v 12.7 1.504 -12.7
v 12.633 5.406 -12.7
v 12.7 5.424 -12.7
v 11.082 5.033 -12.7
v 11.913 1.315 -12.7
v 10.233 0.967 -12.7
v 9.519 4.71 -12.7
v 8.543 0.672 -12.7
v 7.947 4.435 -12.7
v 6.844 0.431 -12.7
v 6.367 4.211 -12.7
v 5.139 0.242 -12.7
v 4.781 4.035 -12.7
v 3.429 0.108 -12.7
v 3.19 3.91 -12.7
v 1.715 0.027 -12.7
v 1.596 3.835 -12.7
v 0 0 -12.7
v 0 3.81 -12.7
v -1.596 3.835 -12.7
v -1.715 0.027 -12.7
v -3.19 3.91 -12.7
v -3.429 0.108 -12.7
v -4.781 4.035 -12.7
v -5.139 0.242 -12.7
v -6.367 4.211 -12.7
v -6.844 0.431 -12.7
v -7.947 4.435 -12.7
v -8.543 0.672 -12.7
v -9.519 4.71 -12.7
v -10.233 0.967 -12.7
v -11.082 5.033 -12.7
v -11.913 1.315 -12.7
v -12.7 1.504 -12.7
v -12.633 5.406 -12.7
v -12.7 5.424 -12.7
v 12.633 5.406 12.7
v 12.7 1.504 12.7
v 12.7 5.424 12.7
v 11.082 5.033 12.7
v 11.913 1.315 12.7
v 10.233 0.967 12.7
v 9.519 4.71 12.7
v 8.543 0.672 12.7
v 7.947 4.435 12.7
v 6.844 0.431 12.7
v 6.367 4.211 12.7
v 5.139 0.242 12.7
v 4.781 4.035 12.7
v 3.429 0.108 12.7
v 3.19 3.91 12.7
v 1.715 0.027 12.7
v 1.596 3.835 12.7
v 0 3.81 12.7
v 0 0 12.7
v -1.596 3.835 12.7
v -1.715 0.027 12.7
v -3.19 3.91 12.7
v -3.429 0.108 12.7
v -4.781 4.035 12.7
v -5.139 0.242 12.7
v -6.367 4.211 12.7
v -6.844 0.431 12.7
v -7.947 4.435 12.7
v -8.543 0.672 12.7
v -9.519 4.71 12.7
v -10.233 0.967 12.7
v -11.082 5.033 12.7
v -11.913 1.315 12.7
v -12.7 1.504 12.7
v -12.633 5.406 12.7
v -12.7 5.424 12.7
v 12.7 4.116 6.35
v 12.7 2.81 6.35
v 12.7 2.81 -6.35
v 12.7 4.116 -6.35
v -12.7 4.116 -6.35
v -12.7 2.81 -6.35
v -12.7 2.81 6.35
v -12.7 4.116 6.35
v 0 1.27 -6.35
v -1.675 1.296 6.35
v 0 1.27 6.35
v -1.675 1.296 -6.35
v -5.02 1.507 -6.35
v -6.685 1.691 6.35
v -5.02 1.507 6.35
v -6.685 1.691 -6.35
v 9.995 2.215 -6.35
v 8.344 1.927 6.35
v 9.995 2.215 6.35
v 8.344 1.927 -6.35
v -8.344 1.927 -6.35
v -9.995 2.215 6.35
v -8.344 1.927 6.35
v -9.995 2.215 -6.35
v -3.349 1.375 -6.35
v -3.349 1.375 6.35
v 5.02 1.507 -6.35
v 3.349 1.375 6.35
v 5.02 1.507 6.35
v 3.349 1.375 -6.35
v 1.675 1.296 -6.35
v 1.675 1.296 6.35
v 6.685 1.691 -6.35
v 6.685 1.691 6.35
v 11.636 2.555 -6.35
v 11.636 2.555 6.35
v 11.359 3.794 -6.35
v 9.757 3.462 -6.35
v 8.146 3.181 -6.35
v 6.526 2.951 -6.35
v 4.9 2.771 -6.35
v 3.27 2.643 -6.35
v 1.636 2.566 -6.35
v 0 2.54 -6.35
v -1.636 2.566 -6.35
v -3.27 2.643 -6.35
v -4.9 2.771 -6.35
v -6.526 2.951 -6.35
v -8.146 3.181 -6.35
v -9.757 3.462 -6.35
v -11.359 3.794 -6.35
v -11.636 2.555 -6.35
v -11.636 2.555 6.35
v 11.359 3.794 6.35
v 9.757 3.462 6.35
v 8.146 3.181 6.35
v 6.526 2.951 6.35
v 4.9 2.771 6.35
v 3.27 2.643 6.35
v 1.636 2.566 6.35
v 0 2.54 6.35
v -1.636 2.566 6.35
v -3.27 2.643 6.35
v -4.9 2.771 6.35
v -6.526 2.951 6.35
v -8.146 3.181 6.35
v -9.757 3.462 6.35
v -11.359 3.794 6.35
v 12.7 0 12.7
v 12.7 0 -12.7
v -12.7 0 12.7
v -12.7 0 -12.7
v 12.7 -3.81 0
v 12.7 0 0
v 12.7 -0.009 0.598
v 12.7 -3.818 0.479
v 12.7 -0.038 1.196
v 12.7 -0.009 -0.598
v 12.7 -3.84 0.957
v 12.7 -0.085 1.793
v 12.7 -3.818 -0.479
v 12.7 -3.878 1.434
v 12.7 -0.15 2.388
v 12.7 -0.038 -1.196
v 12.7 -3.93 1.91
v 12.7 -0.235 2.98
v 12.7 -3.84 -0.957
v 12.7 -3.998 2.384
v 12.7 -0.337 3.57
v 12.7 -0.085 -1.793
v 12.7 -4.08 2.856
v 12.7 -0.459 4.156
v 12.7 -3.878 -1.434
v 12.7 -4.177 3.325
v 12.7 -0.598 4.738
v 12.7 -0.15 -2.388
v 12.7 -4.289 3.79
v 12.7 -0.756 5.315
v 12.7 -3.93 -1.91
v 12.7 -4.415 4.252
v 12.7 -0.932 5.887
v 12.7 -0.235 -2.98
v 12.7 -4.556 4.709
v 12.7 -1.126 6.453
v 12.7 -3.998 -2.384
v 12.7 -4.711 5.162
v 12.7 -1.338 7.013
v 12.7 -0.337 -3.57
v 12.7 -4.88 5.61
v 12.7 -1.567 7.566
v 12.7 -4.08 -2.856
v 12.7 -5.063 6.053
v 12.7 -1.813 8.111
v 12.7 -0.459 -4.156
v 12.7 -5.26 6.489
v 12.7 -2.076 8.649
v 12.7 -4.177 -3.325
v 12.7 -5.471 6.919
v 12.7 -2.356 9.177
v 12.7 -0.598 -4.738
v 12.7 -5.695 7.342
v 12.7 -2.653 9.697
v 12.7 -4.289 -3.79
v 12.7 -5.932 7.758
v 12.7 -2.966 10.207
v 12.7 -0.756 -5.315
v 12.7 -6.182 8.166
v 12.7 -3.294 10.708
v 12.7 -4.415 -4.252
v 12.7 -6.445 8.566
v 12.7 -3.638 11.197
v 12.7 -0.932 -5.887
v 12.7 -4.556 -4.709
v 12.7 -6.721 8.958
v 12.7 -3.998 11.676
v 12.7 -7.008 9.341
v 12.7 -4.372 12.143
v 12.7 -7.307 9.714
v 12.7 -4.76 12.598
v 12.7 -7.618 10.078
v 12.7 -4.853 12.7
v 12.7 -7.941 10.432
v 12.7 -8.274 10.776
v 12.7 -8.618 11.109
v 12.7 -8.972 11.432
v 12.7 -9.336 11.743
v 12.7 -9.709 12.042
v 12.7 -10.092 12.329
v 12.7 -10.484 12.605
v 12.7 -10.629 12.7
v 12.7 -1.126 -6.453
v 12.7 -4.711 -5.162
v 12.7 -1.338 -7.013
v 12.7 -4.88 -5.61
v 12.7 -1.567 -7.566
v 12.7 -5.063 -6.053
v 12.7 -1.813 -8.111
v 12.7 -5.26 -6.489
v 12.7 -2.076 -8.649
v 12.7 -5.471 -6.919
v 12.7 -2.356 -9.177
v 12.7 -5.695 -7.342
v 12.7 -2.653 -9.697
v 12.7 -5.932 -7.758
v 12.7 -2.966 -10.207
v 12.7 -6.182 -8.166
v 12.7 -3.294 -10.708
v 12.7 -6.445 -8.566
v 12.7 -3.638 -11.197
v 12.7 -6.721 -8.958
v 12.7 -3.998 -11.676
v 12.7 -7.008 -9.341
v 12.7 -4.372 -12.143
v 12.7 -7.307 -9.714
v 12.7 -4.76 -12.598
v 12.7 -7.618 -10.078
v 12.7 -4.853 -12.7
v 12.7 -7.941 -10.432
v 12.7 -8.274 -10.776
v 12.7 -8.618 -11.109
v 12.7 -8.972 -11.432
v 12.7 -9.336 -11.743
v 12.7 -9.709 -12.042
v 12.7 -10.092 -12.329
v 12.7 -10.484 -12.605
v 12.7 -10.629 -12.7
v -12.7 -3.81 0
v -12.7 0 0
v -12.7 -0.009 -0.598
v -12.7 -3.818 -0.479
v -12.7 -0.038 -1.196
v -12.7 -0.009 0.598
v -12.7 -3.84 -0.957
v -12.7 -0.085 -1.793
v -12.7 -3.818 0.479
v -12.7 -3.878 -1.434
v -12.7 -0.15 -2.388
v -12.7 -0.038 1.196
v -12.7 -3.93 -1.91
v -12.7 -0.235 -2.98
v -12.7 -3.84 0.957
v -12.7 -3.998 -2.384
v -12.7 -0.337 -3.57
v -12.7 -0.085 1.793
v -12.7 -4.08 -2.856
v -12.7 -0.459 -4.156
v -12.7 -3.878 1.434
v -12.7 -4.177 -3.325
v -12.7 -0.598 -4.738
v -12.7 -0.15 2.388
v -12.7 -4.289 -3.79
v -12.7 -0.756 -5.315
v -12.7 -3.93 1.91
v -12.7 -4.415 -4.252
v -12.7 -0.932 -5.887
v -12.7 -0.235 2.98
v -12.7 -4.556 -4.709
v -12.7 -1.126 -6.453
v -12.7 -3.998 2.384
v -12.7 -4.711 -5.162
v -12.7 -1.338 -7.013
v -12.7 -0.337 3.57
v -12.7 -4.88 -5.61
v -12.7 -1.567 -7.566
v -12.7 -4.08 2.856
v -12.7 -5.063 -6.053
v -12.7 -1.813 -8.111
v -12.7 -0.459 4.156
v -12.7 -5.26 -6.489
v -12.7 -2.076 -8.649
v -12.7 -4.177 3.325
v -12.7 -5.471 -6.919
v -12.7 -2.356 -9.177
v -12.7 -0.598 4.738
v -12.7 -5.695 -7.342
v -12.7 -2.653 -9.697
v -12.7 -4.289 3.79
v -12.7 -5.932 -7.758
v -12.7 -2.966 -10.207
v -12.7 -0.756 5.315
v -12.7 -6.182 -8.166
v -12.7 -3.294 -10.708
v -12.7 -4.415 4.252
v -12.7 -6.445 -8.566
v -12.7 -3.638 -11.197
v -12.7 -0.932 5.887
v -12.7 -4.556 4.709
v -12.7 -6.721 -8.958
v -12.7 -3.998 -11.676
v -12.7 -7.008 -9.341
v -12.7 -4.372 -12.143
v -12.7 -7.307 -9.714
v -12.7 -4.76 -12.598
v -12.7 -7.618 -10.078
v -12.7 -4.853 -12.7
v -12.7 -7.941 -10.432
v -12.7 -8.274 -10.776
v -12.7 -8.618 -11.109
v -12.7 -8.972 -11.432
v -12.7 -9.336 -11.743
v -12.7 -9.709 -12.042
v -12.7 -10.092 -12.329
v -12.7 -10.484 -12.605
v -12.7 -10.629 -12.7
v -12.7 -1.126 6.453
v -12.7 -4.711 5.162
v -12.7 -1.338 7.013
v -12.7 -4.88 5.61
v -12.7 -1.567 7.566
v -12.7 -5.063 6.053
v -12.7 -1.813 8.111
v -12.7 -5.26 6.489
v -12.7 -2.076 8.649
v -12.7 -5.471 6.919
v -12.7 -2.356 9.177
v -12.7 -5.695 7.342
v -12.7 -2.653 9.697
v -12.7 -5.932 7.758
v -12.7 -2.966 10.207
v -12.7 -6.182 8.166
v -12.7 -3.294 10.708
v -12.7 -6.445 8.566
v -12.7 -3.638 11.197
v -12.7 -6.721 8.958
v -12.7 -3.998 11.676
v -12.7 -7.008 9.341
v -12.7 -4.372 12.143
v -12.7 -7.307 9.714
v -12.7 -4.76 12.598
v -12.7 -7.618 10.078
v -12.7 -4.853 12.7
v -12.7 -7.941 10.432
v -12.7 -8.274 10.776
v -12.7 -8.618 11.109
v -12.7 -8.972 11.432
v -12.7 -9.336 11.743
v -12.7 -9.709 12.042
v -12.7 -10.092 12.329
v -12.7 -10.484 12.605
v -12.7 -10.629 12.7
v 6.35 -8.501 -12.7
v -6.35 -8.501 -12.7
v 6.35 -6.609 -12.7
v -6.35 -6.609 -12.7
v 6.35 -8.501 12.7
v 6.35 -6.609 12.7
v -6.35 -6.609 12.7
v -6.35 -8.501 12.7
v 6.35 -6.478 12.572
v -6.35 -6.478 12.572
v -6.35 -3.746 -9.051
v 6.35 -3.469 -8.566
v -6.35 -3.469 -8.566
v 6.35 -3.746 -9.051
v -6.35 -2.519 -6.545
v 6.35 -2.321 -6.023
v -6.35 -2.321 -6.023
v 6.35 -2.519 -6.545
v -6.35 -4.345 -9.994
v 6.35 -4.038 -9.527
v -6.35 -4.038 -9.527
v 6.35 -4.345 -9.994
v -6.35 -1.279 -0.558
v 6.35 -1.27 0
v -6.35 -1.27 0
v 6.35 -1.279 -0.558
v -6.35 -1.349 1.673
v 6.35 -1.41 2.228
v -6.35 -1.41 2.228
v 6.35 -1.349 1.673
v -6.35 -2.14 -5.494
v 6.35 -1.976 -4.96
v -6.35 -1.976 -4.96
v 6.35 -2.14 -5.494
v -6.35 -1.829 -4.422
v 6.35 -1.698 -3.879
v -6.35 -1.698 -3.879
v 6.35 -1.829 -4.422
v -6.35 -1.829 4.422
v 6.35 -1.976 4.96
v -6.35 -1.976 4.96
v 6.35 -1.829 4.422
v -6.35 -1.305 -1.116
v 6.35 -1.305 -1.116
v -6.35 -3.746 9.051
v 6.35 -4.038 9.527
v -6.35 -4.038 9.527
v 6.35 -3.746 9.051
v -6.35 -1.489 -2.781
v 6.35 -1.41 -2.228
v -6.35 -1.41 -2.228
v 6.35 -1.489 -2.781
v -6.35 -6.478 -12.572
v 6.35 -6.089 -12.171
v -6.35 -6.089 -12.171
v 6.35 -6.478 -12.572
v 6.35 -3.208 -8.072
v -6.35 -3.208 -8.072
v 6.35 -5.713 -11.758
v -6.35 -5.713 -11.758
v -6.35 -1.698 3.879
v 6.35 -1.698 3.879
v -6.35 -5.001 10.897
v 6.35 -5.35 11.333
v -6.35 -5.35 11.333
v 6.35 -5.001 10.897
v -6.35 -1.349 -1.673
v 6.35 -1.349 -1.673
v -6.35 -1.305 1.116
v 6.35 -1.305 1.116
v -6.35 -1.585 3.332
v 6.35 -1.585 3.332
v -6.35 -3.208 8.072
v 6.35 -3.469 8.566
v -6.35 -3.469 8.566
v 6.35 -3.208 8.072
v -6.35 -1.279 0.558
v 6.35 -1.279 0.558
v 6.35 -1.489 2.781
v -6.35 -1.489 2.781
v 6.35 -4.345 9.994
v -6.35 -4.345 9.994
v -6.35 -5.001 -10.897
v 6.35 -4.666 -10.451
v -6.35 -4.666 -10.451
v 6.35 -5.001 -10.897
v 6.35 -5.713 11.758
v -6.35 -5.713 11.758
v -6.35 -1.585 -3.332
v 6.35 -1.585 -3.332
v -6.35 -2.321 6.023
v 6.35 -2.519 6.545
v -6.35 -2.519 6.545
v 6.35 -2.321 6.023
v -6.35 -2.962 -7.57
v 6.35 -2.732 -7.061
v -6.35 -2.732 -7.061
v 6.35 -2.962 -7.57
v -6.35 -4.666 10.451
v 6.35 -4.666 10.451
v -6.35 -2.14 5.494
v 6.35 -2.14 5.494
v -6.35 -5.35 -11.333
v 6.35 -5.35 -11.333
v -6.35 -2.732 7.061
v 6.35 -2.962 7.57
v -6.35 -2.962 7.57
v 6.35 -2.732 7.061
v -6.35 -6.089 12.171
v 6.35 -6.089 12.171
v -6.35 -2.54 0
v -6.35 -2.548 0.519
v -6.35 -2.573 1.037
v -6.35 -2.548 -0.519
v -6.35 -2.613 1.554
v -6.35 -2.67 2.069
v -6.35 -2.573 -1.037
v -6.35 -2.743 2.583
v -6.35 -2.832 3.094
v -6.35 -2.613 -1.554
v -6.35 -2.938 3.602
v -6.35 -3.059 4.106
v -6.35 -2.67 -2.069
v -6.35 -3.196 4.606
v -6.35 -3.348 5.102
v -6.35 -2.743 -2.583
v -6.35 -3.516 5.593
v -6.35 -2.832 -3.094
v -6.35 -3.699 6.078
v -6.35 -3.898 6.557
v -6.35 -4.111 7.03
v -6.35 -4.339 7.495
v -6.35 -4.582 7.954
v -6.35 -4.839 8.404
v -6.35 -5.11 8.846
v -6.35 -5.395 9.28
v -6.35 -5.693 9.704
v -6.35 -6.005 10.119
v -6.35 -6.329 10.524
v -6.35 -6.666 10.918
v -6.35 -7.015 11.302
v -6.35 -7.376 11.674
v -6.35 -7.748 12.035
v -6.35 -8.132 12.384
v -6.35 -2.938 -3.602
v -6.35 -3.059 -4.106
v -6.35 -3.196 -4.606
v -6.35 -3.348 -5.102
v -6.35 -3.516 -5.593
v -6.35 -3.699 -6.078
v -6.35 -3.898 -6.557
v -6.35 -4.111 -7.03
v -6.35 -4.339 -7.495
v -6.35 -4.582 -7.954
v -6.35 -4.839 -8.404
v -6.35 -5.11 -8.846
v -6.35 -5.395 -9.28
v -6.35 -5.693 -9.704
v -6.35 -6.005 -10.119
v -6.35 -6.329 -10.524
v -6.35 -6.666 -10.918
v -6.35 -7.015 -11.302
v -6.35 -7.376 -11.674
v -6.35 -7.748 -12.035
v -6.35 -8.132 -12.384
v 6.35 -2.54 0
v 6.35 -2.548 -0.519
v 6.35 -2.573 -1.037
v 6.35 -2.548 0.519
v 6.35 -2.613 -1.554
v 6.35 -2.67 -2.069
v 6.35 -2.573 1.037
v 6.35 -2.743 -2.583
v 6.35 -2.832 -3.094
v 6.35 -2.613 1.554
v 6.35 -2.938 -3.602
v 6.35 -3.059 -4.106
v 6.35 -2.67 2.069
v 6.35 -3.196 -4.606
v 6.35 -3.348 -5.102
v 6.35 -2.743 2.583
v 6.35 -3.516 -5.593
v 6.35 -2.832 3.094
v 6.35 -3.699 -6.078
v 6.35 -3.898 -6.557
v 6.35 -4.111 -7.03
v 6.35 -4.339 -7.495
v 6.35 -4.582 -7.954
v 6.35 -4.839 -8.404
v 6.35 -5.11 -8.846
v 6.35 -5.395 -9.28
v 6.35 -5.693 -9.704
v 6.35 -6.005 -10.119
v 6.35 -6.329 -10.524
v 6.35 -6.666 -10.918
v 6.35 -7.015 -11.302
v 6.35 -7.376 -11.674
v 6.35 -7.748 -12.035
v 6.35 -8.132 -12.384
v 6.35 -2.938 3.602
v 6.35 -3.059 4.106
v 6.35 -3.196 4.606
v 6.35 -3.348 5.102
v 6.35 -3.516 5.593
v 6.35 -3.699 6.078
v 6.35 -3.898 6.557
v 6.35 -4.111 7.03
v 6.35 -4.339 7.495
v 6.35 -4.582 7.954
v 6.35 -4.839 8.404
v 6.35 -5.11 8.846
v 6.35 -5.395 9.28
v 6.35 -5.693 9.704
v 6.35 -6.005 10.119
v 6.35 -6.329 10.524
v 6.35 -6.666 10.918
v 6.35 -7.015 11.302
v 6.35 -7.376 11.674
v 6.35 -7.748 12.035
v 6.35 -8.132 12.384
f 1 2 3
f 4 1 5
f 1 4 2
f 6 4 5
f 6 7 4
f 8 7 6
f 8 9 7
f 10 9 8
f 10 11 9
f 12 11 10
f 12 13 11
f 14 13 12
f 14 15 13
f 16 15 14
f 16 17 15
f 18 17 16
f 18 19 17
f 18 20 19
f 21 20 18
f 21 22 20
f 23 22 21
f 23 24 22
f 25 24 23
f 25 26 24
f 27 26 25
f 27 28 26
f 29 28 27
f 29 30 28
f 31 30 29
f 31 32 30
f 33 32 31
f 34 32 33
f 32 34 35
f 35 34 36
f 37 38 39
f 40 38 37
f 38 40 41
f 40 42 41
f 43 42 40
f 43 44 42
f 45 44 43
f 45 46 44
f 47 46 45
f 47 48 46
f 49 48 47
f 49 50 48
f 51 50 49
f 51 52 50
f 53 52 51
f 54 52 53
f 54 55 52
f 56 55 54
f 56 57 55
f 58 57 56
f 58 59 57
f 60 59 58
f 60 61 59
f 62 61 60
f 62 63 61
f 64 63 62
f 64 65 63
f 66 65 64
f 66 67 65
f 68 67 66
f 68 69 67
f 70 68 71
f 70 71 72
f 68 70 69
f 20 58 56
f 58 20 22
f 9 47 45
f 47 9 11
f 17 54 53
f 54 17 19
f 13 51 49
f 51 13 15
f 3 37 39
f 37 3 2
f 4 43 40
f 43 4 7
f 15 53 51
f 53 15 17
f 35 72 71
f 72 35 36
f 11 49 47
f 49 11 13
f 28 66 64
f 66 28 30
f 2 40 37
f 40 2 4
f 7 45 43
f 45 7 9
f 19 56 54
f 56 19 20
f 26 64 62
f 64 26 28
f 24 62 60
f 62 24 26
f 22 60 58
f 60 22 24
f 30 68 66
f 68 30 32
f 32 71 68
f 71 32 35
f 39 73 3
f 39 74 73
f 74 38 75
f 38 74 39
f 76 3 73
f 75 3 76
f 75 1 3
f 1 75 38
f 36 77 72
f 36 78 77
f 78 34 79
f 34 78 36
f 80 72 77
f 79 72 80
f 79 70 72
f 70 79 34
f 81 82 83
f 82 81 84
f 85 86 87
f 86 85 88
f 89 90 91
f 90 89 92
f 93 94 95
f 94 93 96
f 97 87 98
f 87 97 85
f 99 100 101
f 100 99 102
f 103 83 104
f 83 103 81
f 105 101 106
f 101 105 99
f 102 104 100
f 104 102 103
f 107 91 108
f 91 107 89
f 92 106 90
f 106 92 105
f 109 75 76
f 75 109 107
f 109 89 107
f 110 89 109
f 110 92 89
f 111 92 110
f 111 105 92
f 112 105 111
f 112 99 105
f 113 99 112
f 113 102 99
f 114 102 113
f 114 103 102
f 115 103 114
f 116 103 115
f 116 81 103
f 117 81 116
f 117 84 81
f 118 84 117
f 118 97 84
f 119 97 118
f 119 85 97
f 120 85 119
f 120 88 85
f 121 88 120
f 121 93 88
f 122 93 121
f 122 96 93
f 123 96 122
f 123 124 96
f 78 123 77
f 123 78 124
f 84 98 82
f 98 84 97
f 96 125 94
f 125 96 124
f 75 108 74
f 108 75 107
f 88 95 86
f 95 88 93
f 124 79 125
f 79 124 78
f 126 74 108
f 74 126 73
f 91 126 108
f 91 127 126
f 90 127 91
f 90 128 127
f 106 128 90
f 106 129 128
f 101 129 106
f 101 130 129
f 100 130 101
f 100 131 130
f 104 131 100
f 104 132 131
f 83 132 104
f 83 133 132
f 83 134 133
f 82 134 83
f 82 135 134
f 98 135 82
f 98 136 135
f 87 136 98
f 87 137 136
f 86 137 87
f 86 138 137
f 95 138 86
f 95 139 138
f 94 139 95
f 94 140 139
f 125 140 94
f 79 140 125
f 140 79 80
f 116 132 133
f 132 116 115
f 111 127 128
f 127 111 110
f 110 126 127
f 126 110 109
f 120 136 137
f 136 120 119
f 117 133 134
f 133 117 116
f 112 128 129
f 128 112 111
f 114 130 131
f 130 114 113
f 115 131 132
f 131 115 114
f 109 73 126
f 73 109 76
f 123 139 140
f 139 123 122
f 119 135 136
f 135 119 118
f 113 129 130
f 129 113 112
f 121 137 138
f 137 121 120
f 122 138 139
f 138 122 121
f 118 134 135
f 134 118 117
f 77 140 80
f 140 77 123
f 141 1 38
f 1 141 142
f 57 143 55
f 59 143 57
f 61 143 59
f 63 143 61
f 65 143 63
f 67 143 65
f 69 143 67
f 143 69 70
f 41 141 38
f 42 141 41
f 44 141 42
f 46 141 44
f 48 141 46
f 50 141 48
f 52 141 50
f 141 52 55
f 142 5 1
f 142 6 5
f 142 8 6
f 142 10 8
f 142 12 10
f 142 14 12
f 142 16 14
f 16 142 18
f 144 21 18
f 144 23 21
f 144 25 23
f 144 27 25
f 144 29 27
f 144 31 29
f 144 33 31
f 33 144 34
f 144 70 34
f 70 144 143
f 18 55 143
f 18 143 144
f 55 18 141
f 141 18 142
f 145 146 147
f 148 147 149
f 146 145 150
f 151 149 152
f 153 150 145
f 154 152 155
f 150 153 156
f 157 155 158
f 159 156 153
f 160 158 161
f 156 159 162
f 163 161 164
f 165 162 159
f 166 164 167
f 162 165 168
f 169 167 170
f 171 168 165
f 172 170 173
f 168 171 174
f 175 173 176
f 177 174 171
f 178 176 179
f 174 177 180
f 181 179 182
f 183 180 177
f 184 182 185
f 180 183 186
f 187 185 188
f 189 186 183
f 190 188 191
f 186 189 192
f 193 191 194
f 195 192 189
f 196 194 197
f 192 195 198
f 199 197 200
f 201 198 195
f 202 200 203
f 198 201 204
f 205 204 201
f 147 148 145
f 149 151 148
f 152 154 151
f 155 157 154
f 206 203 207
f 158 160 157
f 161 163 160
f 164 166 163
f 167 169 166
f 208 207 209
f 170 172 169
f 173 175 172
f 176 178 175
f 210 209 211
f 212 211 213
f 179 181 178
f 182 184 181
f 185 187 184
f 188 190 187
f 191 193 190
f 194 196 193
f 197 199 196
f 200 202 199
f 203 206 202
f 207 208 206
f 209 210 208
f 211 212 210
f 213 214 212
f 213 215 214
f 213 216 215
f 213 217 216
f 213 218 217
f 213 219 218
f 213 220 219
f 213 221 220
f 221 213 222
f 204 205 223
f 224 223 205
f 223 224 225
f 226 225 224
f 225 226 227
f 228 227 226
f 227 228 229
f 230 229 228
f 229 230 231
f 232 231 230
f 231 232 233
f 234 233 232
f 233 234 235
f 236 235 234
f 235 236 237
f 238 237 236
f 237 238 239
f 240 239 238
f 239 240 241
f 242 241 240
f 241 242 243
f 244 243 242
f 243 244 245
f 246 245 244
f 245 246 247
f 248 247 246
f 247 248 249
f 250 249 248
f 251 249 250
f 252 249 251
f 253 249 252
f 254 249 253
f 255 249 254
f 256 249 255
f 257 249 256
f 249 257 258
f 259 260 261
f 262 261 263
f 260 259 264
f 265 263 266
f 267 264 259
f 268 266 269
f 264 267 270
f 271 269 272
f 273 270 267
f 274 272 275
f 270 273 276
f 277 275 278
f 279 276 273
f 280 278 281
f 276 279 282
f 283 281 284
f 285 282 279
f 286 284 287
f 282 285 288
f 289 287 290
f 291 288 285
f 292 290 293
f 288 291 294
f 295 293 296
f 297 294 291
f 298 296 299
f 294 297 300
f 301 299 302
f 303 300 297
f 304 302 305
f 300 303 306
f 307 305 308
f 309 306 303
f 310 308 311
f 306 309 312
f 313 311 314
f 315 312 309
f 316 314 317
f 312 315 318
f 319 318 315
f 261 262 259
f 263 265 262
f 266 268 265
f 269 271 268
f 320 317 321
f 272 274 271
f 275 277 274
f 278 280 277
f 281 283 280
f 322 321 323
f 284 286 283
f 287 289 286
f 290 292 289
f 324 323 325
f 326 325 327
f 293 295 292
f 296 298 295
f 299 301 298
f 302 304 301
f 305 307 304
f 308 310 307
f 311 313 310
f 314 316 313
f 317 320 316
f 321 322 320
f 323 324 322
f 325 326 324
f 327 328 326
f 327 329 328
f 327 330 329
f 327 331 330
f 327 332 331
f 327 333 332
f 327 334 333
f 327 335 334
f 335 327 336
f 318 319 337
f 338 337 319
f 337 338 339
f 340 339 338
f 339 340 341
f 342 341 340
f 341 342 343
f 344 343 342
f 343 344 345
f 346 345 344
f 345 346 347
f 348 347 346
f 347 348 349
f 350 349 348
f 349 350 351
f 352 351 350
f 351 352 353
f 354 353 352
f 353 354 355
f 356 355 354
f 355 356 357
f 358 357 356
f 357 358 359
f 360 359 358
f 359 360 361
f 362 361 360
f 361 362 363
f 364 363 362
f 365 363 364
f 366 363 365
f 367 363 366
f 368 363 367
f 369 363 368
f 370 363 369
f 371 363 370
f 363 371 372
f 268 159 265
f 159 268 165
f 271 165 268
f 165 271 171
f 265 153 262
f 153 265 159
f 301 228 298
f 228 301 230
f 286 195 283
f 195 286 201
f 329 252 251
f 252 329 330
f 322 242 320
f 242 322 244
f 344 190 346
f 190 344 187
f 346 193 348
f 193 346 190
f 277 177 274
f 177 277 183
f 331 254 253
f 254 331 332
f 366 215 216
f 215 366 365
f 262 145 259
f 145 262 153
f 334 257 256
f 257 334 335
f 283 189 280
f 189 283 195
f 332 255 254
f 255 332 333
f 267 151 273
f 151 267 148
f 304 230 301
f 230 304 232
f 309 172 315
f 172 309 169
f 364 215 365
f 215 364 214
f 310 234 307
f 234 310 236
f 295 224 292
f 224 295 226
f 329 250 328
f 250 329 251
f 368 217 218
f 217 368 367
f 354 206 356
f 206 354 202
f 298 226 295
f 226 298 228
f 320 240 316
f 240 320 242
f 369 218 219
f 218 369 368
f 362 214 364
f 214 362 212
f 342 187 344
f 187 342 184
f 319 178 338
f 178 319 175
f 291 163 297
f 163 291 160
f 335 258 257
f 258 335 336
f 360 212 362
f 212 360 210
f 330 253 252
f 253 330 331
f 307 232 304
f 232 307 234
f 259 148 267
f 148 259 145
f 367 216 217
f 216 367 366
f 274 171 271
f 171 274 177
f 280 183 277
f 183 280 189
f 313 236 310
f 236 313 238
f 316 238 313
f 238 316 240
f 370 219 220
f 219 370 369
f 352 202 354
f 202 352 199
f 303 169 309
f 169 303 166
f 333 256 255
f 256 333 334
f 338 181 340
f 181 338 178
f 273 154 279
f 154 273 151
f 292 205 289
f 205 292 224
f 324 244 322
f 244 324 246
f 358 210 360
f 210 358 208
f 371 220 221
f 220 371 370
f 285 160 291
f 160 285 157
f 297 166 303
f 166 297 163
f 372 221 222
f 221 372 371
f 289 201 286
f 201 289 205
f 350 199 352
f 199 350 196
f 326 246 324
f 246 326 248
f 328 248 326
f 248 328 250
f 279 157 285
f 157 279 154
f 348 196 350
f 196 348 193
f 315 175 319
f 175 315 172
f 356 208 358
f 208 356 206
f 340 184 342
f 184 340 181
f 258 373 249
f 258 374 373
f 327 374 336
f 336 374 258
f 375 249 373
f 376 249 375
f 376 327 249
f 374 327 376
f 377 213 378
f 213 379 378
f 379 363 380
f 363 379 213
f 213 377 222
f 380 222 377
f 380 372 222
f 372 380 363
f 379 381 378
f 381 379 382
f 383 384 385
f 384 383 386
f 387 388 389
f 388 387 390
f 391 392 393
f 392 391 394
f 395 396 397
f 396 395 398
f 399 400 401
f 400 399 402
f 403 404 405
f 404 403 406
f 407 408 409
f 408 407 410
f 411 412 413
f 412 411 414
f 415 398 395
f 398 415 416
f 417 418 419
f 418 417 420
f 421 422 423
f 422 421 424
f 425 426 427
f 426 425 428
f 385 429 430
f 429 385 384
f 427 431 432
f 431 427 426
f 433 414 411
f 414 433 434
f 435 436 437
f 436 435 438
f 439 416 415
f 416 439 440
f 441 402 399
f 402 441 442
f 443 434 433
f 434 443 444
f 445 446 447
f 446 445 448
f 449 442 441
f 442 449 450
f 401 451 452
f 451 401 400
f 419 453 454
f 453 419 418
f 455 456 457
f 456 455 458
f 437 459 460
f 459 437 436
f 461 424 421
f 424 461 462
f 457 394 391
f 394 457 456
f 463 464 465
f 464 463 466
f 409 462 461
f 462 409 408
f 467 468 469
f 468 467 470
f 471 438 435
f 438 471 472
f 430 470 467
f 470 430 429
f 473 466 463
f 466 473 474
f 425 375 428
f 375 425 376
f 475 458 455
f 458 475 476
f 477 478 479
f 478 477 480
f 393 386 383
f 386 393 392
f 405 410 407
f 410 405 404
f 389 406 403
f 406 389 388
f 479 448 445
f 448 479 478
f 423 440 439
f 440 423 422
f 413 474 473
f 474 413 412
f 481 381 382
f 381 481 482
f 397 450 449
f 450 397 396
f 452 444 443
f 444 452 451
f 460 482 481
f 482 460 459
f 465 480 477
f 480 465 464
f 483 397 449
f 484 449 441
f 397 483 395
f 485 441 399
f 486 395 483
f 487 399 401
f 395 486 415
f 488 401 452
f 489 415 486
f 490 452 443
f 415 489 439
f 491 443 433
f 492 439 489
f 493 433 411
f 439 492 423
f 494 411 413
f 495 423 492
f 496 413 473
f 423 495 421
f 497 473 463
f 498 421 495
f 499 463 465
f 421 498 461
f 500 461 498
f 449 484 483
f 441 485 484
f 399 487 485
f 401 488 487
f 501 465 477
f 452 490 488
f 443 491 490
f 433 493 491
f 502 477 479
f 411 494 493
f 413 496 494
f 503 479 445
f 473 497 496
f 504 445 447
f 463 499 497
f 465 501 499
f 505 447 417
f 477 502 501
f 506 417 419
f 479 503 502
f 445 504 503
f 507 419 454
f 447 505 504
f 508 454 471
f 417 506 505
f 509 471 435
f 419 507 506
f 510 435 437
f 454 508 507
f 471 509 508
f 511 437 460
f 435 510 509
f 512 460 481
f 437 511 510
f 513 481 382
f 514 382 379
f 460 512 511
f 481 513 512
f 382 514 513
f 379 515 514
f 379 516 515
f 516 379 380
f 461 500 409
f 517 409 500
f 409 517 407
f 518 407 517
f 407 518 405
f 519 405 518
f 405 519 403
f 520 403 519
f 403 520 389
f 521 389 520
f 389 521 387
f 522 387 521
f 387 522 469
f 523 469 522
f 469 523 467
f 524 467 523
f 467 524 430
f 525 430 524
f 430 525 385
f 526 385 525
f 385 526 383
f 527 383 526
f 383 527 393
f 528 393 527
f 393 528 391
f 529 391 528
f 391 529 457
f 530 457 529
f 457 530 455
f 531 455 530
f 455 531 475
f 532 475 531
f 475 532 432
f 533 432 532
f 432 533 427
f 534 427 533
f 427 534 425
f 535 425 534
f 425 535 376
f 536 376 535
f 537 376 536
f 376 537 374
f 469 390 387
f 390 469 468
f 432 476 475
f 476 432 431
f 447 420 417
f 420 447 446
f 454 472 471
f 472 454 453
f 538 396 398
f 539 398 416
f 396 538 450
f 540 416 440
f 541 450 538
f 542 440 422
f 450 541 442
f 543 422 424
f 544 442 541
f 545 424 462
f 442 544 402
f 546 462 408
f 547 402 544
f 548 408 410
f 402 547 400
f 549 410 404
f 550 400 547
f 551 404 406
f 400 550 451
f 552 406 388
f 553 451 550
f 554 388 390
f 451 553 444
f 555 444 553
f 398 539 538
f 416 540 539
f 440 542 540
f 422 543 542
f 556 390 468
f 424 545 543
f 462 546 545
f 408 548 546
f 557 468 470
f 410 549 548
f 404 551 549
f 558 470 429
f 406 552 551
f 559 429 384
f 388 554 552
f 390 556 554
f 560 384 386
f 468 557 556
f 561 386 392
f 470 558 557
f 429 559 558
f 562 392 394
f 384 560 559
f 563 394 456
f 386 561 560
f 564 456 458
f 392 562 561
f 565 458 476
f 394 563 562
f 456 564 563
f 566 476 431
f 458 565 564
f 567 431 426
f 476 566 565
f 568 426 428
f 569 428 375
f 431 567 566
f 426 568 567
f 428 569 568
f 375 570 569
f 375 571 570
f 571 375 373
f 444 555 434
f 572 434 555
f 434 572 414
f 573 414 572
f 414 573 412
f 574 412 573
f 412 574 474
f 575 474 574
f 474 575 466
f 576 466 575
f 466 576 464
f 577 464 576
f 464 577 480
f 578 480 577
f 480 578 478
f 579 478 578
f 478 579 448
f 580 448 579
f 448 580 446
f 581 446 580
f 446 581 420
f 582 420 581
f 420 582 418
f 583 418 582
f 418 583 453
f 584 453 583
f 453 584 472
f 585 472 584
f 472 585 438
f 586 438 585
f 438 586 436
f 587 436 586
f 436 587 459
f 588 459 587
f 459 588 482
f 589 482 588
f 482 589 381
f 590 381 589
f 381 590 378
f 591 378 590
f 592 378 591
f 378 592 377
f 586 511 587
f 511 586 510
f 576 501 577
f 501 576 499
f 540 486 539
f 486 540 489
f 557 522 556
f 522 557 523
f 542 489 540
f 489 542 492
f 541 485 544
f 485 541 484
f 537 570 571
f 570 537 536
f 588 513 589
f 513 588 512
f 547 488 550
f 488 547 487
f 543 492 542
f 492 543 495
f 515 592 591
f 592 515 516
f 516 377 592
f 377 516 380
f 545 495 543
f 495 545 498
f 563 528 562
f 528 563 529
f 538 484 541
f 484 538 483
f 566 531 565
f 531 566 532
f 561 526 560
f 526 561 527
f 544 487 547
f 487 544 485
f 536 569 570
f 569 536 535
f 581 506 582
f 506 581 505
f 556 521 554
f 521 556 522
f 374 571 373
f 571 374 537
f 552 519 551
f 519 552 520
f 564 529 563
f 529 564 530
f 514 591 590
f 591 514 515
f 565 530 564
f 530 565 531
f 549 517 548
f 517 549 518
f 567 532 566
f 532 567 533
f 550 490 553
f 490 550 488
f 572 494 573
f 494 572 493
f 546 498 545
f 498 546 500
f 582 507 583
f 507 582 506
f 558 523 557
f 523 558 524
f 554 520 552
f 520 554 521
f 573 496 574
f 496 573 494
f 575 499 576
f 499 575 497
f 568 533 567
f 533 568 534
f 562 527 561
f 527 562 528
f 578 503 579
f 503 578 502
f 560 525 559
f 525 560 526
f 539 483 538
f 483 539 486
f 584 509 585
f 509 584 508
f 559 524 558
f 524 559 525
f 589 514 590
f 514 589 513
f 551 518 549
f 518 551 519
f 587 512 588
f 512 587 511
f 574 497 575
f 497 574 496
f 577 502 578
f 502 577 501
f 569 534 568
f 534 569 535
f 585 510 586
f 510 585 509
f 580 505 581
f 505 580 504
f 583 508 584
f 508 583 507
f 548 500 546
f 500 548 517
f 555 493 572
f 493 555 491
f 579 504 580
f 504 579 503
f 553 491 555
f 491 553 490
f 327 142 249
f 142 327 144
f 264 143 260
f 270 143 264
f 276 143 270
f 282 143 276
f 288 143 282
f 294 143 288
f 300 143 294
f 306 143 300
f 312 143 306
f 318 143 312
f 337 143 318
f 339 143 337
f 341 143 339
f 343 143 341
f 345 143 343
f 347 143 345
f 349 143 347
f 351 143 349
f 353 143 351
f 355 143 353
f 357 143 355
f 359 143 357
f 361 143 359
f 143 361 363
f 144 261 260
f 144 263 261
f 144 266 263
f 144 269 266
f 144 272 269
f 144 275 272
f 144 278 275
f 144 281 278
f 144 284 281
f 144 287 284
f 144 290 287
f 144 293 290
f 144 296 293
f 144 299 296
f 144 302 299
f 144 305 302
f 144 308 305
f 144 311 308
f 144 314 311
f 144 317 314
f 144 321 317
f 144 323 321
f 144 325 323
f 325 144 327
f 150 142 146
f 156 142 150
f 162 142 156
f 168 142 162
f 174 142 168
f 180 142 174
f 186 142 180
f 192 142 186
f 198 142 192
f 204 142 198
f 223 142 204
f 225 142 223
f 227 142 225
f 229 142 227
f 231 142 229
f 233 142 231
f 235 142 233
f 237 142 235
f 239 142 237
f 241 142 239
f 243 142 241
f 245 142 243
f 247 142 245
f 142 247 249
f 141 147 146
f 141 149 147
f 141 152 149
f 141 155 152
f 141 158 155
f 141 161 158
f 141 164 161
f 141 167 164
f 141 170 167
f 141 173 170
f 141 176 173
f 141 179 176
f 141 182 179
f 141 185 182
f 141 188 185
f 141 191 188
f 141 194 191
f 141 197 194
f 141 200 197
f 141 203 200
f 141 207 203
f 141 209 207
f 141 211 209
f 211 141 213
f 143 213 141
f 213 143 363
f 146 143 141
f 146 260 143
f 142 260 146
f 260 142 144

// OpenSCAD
$fn=200;

translate([0, in2mm(4.3)/2, 0]) 
    pipeWrap(in2mm(4.0), in2mm(0.1), in2mm(0.5), in2mm(1), in2mm(0.25), in2mm(1));
rotate([0, 90, 180]) 
    translate([0, in2mm(1.5)/2, 0]) 
    pipeWrap(in2mm(1.2), in2mm(0.1), in2mm(0.5), in2mm(1), in2mm(0.25), in2mm(1));


module pipeWrap(diameter, width, innerHeight, outerHeight, padding, clipLength) {
    maxDiameter = (diameter+(width*3));
    
    translate([0, 0, -outerHeight/2]) difference() {
        difference() {
            union() {
                translate([0,0,(outerHeight-(innerHeight+(padding*2)))/2]) difference() {
                    cylinder(h=innerHeight+(padding*2), d=maxDiameter);
                    translate([0,0,-1]) cylinder(h=innerHeight+(padding*2)+2, d=(diameter+width));
                }
                difference() {
                    cylinder(h=outerHeight, d=(diameter+width));
                    translate([0,0,-1]) cylinder(h=outerHeight+2, d=diameter);
                }
            }
            translate([0,0,-1]) union() {
                translate([clipLength/2, -(maxDiameter)/2, 0]) cube([maxDiameter, maxDiameter,outerHeight+2]);
                translate([-maxDiameter-(clipLength/2), -(maxDiameter)/2, 0]) cube([maxDiameter, maxDiameter,outerHeight+2]);
                translate([-maxDiameter/2, 0, 0]) cube([maxDiameter, maxDiameter,outerHeight+2]);
            }
        }
        translate([0,0,(outerHeight-innerHeight)/2]) difference() {
            cylinder(h=innerHeight, d=diameter+(width*2));
            translate([0,0,-1]) cylinder(h=innerHeight+2, d=(diameter+width));
        }
    }
    
    difference() {
        translate([-(clipLength/2), -(maxDiameter/2), -(innerHeight+(padding*2))/2]) cube([clipLength, width*3, innerHeight+(padding*2)]);
        translate([0, 0, -2-((innerHeight+(padding*2))/2)]) cylinder(h=outerHeight+2, d=maxDiameter);
    }
}

function in2mm(value) = value*25.4;
